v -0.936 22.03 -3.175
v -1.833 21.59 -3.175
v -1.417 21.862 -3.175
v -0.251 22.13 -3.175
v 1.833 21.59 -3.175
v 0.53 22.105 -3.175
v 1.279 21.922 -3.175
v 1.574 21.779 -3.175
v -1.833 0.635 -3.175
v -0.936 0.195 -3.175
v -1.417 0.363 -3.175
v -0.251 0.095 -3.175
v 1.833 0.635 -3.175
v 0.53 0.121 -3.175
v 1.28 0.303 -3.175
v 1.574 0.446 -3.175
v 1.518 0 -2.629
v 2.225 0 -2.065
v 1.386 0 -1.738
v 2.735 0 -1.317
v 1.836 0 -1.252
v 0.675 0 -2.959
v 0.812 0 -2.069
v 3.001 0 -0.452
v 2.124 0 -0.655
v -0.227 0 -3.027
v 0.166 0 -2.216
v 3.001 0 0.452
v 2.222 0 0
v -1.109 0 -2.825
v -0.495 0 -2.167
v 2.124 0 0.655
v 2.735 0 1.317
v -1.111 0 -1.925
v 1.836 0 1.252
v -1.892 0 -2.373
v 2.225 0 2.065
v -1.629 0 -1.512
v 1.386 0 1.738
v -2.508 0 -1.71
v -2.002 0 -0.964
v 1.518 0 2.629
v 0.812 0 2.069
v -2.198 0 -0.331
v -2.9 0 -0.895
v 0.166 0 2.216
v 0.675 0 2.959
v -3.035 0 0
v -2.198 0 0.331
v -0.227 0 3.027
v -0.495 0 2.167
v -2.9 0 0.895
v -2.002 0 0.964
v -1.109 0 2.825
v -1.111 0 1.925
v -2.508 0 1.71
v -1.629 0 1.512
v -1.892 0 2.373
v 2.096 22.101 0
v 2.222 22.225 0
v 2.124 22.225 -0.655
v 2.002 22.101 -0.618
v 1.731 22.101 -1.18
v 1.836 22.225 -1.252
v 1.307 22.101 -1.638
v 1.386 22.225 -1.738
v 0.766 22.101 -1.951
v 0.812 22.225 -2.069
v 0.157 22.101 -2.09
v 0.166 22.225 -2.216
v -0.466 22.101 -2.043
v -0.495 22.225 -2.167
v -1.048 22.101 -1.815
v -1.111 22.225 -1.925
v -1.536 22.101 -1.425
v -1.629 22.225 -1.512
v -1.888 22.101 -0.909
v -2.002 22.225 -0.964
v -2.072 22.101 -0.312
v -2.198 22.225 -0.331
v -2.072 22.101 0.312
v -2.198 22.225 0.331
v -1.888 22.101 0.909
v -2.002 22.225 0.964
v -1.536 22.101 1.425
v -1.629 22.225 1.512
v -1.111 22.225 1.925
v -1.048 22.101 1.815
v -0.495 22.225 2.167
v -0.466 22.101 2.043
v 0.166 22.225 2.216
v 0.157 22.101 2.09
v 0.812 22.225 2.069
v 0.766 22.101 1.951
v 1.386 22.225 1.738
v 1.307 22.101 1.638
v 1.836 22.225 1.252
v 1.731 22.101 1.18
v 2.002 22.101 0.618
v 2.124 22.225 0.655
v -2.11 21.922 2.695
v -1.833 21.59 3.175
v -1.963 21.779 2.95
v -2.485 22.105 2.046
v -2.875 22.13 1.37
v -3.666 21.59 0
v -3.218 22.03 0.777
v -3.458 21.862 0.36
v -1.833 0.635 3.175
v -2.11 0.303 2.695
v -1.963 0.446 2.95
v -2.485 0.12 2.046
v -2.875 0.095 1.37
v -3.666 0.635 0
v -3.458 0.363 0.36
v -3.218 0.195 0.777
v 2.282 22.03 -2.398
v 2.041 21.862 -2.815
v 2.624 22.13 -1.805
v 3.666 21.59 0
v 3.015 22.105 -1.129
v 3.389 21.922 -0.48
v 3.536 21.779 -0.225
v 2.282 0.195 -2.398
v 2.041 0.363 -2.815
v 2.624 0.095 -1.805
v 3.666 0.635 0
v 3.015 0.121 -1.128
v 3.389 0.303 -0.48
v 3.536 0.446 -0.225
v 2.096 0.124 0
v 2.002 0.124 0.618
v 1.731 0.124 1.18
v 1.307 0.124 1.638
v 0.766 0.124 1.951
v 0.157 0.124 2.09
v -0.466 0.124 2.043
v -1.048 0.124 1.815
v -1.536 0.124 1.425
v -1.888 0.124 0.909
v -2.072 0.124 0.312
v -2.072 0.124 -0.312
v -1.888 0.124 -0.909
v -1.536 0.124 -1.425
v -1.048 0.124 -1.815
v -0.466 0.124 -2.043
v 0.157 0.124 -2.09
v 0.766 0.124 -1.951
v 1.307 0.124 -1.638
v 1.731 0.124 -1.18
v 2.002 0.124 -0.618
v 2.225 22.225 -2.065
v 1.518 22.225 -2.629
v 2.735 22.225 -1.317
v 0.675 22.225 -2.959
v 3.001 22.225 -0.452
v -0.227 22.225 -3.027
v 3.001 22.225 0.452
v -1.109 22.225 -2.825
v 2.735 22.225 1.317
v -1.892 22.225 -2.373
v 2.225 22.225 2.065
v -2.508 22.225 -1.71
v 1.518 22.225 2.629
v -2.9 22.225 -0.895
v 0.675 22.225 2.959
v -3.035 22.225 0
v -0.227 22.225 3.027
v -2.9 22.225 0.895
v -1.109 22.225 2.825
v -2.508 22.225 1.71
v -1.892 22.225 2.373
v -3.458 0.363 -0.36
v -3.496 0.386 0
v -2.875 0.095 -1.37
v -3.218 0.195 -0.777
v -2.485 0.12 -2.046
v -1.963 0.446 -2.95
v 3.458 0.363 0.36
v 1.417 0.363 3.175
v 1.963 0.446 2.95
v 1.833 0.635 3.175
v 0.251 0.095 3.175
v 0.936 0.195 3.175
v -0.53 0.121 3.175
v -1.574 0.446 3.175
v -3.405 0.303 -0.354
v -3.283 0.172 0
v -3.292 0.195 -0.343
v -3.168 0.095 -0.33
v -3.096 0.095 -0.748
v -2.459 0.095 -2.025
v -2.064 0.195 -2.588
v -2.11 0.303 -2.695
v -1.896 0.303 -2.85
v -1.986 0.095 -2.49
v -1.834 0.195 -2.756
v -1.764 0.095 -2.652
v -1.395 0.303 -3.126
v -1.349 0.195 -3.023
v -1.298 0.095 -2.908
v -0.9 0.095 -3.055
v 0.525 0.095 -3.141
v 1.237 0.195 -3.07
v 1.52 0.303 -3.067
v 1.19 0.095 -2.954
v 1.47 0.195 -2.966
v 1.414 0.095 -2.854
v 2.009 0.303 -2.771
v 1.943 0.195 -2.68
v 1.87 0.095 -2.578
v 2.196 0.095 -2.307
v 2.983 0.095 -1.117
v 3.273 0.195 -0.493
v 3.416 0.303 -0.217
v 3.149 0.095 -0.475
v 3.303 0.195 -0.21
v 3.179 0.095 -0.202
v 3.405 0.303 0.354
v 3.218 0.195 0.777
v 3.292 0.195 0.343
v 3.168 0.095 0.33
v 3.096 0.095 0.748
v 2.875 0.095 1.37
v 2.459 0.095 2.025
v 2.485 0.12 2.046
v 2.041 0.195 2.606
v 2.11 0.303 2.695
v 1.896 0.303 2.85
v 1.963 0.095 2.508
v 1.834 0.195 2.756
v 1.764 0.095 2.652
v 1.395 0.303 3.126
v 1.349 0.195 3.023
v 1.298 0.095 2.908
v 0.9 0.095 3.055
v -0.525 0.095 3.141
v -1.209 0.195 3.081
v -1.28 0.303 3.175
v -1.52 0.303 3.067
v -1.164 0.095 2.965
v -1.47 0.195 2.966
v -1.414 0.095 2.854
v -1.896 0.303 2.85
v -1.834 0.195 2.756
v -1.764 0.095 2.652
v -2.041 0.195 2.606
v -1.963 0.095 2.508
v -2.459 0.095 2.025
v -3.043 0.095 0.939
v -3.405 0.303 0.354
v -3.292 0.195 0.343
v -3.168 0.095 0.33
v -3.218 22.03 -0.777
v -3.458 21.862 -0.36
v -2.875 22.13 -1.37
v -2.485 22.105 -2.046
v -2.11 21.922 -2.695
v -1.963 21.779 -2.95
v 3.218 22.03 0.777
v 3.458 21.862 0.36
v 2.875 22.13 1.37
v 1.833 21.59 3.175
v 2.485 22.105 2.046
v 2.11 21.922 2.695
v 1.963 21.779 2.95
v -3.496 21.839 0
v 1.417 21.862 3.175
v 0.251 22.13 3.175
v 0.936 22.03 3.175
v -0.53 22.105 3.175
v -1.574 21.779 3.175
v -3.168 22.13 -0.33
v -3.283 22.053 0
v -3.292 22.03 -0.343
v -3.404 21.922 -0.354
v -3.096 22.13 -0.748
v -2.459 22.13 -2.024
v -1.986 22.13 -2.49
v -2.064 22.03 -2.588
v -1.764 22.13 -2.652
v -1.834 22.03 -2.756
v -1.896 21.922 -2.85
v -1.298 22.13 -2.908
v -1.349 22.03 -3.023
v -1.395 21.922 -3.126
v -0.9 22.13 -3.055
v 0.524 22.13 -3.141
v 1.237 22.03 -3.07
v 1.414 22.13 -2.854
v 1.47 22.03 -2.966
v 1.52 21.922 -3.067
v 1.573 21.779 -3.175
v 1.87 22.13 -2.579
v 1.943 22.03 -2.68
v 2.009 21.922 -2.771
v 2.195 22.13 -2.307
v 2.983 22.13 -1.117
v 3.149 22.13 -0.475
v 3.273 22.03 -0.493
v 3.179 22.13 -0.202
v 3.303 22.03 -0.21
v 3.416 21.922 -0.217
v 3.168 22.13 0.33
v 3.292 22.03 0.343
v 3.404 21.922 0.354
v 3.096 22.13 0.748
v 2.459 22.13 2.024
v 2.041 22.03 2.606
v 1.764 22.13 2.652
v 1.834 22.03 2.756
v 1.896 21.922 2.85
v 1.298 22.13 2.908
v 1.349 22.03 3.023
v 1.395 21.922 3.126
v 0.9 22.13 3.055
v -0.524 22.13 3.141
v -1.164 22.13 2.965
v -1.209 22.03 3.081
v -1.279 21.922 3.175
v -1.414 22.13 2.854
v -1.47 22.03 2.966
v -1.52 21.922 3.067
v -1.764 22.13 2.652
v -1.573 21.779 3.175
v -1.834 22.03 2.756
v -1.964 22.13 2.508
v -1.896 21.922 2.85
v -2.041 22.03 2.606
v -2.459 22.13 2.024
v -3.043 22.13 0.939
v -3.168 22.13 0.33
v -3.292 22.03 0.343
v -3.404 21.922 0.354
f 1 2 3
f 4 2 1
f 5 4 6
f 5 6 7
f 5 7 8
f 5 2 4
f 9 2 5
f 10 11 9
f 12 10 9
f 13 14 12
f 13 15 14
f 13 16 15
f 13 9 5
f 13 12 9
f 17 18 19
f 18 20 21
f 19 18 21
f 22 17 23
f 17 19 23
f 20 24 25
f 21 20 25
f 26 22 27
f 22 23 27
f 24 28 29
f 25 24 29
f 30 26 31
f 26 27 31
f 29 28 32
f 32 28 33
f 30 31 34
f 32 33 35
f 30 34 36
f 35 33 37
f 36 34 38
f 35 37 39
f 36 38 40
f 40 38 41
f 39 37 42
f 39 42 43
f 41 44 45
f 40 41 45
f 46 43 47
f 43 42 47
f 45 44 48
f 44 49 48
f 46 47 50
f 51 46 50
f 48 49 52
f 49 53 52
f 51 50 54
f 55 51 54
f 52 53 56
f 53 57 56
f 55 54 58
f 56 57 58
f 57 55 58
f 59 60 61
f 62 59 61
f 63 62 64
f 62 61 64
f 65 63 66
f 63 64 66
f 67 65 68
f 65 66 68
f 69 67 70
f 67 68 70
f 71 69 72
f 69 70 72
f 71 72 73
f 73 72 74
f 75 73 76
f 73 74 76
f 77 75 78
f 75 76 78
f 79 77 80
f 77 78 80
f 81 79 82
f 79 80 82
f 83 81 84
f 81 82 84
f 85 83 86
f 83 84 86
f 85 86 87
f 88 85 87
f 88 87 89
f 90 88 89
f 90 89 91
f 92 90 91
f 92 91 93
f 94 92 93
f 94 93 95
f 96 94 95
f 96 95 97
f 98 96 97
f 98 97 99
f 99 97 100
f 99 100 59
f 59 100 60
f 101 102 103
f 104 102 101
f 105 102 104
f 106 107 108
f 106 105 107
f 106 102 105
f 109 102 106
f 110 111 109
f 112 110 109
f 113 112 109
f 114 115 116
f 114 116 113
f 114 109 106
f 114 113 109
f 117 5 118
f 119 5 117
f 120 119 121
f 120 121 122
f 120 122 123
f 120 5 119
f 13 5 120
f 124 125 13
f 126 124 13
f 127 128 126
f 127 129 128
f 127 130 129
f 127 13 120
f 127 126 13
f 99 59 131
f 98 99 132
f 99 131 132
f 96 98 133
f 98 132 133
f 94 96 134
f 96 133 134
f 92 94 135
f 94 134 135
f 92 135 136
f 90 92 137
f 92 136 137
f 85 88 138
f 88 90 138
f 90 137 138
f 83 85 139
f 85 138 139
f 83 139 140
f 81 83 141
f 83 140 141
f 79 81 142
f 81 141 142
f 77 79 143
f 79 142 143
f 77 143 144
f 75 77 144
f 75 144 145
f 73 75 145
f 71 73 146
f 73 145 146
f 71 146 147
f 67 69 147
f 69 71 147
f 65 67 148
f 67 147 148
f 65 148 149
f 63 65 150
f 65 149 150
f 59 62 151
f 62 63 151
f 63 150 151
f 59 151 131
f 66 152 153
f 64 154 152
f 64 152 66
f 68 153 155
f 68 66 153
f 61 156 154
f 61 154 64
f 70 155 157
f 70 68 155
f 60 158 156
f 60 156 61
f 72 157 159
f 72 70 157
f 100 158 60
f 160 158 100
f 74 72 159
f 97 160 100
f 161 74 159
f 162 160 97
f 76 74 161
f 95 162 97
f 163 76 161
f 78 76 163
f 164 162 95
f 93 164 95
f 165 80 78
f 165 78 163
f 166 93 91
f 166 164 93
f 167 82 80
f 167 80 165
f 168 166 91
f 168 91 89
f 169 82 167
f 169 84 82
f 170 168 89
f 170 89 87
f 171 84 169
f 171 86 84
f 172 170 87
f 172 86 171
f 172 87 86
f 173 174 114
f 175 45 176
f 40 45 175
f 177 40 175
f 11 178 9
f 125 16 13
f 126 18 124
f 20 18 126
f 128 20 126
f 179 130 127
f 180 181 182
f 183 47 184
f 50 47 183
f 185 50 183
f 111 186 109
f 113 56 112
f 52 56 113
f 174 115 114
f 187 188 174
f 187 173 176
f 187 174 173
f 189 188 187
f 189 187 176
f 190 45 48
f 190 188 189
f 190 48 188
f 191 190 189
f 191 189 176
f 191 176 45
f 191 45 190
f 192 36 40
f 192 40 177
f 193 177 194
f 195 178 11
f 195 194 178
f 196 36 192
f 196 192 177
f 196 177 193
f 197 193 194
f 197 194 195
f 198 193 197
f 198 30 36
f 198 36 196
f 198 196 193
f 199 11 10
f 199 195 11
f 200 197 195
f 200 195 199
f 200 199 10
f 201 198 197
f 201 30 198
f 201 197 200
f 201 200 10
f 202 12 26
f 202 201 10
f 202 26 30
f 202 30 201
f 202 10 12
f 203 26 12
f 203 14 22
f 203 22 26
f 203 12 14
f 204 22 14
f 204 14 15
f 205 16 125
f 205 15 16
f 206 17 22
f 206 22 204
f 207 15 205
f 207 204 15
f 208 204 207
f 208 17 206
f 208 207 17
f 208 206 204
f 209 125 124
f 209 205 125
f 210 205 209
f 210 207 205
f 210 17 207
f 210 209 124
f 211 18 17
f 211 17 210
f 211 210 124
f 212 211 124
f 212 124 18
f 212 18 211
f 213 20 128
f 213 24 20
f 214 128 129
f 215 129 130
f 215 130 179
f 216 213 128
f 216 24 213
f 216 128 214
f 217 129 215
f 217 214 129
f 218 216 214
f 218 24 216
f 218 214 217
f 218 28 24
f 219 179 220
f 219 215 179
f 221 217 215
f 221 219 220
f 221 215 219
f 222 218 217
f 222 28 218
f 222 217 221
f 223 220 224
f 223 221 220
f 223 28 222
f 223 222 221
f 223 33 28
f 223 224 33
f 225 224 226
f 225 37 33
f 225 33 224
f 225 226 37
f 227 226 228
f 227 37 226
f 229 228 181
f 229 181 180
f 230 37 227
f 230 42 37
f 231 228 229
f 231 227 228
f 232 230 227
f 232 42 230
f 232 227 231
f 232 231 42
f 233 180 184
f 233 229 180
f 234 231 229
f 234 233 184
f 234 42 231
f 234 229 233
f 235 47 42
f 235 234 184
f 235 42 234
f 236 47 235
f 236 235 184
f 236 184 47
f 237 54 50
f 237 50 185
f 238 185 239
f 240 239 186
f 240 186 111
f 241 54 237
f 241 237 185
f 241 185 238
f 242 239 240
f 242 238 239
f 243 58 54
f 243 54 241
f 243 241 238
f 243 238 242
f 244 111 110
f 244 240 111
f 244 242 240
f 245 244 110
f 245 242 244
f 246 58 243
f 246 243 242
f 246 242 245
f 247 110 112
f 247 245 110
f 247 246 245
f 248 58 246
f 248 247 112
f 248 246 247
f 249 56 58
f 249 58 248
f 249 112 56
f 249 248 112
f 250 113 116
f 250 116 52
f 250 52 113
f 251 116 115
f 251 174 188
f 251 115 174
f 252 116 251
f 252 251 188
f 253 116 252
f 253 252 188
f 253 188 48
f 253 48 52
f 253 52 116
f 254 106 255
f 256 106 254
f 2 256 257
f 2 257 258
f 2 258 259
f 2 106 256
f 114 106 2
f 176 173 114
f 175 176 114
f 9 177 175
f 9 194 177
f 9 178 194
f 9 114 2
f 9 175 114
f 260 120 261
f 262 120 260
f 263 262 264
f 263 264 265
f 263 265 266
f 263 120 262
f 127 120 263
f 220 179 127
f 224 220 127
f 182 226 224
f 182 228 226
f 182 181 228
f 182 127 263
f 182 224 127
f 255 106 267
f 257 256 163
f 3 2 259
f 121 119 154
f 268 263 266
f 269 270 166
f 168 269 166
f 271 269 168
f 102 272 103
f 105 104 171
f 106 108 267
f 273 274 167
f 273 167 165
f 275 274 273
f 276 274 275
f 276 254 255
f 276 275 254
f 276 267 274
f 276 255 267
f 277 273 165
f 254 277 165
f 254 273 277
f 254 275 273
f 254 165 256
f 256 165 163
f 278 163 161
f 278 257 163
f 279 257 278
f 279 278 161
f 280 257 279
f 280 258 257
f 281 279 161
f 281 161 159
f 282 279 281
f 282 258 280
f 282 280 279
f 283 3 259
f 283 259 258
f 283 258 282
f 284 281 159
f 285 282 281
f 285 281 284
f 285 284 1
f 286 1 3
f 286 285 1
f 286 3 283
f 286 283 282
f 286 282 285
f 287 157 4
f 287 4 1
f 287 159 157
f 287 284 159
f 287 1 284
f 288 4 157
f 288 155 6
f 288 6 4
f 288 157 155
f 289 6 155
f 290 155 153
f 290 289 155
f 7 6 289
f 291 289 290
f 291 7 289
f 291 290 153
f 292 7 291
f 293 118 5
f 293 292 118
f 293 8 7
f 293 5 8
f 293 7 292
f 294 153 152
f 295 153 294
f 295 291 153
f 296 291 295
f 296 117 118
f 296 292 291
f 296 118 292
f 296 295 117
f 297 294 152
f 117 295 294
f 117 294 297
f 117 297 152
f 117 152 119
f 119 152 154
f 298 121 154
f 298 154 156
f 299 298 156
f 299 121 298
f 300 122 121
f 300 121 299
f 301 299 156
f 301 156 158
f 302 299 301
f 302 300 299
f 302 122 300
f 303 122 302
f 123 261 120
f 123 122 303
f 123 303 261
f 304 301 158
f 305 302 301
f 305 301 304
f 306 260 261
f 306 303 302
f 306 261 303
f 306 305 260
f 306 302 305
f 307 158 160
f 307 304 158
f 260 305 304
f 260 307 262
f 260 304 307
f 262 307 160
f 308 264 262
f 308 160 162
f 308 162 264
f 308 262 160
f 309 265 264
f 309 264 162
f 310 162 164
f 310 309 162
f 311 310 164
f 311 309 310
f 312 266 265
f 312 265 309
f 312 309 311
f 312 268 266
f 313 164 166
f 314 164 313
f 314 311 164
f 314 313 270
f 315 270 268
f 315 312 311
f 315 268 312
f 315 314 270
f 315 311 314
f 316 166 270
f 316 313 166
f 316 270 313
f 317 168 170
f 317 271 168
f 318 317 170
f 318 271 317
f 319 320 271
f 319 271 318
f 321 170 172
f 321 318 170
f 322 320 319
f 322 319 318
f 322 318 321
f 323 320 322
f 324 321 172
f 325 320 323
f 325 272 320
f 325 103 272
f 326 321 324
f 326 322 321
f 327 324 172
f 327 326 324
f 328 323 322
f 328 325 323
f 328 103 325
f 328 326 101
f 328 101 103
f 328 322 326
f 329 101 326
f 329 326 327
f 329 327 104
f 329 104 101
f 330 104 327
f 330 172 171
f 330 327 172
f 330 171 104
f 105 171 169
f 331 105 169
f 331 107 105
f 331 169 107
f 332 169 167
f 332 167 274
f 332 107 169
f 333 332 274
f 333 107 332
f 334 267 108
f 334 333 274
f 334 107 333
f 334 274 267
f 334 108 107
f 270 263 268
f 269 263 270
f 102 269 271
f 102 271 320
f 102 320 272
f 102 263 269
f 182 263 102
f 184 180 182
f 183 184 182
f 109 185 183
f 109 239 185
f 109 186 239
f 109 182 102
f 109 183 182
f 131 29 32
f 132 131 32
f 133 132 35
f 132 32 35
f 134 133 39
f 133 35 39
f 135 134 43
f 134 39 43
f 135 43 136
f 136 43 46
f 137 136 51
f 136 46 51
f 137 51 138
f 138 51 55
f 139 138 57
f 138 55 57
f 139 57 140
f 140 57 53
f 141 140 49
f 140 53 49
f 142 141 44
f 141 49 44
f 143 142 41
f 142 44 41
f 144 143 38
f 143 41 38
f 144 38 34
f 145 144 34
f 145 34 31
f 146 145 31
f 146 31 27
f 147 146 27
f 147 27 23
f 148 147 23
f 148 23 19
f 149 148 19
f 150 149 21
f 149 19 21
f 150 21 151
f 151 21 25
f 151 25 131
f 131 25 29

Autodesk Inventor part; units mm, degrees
ref_plane "YZ Plane" through (0, 0, 0) normal (1, 0, 0) x (0, 1, 0)
ref_plane "XZ Plane" through (0, 0, 0) normal (0, 1, 0) x (-1, 0, 0)
ref_plane "XY Plane" through (0, 0, 0) normal (0, 0, 1) x (1, 0, 0)
sketch "Sketch1" plane through (0, 0, 0) normal (0, 1, 0) x (-1, 0, 0)
  line L0 (-1.8331, -3.175) -> (-3.6662, 0)
  line L1 (-3.6662, 0) -> (-1.8331, 3.175)
  line L2 (-1.8331, 3.175) -> (1.8331, 3.175)
  line L3 (1.8331, 3.175) -> (3.6662, 0)
  line L4 (3.6662, 0) -> (1.8331, -3.175)
  line L5 (1.8331, -3.175) -> (-1.8331, -3.175)
  point P0 (0, 0)
  point P1 (0, 0)
  dimension "d0" = 6.35
extrude "Body" add sketch "Sketch1" along normal blind 22.225
sketch "Sketch2" plane through (0, 22.225, 0) normal (0, 1, 0) x (1, 0, 0)
  circle A0 centre (0, 0) radius 2.0955
  dimension "d3" = 4.191
extrude "Hole 2" cut sketch "Sketch2" against normal blind 12.7
sketch "Sketch3" plane through (0, 0, 0) normal (0, -1, 0) x (1, 0, 0)
  circle A0 centre (0, 0) radius 2.0955
  dimension "d6" = 4.191
extrude "Hole 1" cut sketch "Sketch3" against normal blind 12.7
chamfer "Hole 2 Chamfer 1" distance 0.127 distance2 0.1244 1 edges at (-2.0955, 22.225, 0) measured on face at (0.0842, 22.225, 2.8101)
chamfer "Hole 1 Chamfer 1" distance 0.127 distance2 0.1244 1 edges at (-2.0955, 0, 0) measured on face at (-0.0842, 0, 2.8101)
sketch "Sketch4" plane through (0, 0, 0) normal (0, 0, 1) x (1, 0, 0)
  line L0 (1.8331, 22.225) -> (-1.8331, 22.225) projected
  line L1 (0, 22.225) -> (-3.0353, 22.225)
  line L2 (-3.6662, 22.225) -> (-1.8331, 22.225) projected
  line L3 (-3.6662, 0) -> (-3.6662, 22.225) projected
  arc A0 (-3.0353, 22.225) -> (-3.6662, 21.59) centre (-2.2234, 20.7874) ccw
  line L4 (-3.6662, 21.59) -> (-6.3588, 24.1897)
  line L5 (-6.3588, 24.1897) -> (0, 22.225)
  line L6 (0, 22.225) -> (0, 75.889)
  point P0 (0, 0)
  dimension "d15" = 3.0353
  dimension "d16" = 1.651
  dimension "d17" = 0.635
revolve "Hole 2 Chamfer 2" cut sketch "Sketch4" angle 360 about axis through (0, 22.225, 0) along (0, 1, 0)
sketch "Sketch5" plane through (0, 0, 0) normal (0, 0, 1) x (1, 0, 0)
  line L0 (0, 0) -> (-3.0353, 0)
  line L1 (1.8331, 0) -> (-1.8331, 0) projected
  line L2 (-3.6662, 0) -> (-3.6662, 22.225) projected
  arc A0 (-3.6662, 0.635) -> (-3.0353, 0) centre (-2.2234, 1.4376) ccw
  line L3 (0, 0) -> (0, -2.1986)
  line L4 (-3.6662, 0.635) -> (-4.1154, -0.8715)
  line L5 (-4.1154, -0.8715) -> (0, 0)
  point P0 (-3.6662, 21.59)
  dimension "d19" = 3.0353
  dimension "d20" = 1.651
  dimension "d21" = 0.635
revolve "Hole 1 Chamfer 2" cut sketch "Sketch5" angle 360 about axis through (0, 0, 0) along (0, -1, 0)
chamfer "Hole 2 Chamfer 1 For Short" [suppressed]
sketch "Sketch7" plane through (0, 0, 0) normal (0, 0, 1) x (1, 0, 0)
  line L0 (0, 22.2254) -> (3.0353, 22.225)
  line L1 (3.6662, 22.225) -> (1.8331, 22.225) projected
  line L2 (3.6662, 0.635) -> (3.6662, 22.225) projected
  arc A0 (3.6662, 21.59) -> (3.0353, 22.225) centre (2.2234, 20.7874) ccw
  line L3 (3.6662, 21.59) -> (4.2663, 23.1282)
  line L4 (4.2663, 23.1282) -> (0, 22.2254)
  line L5 (0, 24.0311) -> (0, 22.2254)
  line L6 (1.8331, 22.225) -> (-1.8331, 22.225) projected
  point P0 (0, 0)
  point P1 (0, 22.225)
  dimension "d33" = 3.0353
  dimension "d34" = 1.651
  dimension "d35" = 0.635
revolve "Hole 2 Chamfer 2 For Short" [suppressed]
properties part number "Standoff .5" material "VEX Aluminum Alloy 5052-H32"
